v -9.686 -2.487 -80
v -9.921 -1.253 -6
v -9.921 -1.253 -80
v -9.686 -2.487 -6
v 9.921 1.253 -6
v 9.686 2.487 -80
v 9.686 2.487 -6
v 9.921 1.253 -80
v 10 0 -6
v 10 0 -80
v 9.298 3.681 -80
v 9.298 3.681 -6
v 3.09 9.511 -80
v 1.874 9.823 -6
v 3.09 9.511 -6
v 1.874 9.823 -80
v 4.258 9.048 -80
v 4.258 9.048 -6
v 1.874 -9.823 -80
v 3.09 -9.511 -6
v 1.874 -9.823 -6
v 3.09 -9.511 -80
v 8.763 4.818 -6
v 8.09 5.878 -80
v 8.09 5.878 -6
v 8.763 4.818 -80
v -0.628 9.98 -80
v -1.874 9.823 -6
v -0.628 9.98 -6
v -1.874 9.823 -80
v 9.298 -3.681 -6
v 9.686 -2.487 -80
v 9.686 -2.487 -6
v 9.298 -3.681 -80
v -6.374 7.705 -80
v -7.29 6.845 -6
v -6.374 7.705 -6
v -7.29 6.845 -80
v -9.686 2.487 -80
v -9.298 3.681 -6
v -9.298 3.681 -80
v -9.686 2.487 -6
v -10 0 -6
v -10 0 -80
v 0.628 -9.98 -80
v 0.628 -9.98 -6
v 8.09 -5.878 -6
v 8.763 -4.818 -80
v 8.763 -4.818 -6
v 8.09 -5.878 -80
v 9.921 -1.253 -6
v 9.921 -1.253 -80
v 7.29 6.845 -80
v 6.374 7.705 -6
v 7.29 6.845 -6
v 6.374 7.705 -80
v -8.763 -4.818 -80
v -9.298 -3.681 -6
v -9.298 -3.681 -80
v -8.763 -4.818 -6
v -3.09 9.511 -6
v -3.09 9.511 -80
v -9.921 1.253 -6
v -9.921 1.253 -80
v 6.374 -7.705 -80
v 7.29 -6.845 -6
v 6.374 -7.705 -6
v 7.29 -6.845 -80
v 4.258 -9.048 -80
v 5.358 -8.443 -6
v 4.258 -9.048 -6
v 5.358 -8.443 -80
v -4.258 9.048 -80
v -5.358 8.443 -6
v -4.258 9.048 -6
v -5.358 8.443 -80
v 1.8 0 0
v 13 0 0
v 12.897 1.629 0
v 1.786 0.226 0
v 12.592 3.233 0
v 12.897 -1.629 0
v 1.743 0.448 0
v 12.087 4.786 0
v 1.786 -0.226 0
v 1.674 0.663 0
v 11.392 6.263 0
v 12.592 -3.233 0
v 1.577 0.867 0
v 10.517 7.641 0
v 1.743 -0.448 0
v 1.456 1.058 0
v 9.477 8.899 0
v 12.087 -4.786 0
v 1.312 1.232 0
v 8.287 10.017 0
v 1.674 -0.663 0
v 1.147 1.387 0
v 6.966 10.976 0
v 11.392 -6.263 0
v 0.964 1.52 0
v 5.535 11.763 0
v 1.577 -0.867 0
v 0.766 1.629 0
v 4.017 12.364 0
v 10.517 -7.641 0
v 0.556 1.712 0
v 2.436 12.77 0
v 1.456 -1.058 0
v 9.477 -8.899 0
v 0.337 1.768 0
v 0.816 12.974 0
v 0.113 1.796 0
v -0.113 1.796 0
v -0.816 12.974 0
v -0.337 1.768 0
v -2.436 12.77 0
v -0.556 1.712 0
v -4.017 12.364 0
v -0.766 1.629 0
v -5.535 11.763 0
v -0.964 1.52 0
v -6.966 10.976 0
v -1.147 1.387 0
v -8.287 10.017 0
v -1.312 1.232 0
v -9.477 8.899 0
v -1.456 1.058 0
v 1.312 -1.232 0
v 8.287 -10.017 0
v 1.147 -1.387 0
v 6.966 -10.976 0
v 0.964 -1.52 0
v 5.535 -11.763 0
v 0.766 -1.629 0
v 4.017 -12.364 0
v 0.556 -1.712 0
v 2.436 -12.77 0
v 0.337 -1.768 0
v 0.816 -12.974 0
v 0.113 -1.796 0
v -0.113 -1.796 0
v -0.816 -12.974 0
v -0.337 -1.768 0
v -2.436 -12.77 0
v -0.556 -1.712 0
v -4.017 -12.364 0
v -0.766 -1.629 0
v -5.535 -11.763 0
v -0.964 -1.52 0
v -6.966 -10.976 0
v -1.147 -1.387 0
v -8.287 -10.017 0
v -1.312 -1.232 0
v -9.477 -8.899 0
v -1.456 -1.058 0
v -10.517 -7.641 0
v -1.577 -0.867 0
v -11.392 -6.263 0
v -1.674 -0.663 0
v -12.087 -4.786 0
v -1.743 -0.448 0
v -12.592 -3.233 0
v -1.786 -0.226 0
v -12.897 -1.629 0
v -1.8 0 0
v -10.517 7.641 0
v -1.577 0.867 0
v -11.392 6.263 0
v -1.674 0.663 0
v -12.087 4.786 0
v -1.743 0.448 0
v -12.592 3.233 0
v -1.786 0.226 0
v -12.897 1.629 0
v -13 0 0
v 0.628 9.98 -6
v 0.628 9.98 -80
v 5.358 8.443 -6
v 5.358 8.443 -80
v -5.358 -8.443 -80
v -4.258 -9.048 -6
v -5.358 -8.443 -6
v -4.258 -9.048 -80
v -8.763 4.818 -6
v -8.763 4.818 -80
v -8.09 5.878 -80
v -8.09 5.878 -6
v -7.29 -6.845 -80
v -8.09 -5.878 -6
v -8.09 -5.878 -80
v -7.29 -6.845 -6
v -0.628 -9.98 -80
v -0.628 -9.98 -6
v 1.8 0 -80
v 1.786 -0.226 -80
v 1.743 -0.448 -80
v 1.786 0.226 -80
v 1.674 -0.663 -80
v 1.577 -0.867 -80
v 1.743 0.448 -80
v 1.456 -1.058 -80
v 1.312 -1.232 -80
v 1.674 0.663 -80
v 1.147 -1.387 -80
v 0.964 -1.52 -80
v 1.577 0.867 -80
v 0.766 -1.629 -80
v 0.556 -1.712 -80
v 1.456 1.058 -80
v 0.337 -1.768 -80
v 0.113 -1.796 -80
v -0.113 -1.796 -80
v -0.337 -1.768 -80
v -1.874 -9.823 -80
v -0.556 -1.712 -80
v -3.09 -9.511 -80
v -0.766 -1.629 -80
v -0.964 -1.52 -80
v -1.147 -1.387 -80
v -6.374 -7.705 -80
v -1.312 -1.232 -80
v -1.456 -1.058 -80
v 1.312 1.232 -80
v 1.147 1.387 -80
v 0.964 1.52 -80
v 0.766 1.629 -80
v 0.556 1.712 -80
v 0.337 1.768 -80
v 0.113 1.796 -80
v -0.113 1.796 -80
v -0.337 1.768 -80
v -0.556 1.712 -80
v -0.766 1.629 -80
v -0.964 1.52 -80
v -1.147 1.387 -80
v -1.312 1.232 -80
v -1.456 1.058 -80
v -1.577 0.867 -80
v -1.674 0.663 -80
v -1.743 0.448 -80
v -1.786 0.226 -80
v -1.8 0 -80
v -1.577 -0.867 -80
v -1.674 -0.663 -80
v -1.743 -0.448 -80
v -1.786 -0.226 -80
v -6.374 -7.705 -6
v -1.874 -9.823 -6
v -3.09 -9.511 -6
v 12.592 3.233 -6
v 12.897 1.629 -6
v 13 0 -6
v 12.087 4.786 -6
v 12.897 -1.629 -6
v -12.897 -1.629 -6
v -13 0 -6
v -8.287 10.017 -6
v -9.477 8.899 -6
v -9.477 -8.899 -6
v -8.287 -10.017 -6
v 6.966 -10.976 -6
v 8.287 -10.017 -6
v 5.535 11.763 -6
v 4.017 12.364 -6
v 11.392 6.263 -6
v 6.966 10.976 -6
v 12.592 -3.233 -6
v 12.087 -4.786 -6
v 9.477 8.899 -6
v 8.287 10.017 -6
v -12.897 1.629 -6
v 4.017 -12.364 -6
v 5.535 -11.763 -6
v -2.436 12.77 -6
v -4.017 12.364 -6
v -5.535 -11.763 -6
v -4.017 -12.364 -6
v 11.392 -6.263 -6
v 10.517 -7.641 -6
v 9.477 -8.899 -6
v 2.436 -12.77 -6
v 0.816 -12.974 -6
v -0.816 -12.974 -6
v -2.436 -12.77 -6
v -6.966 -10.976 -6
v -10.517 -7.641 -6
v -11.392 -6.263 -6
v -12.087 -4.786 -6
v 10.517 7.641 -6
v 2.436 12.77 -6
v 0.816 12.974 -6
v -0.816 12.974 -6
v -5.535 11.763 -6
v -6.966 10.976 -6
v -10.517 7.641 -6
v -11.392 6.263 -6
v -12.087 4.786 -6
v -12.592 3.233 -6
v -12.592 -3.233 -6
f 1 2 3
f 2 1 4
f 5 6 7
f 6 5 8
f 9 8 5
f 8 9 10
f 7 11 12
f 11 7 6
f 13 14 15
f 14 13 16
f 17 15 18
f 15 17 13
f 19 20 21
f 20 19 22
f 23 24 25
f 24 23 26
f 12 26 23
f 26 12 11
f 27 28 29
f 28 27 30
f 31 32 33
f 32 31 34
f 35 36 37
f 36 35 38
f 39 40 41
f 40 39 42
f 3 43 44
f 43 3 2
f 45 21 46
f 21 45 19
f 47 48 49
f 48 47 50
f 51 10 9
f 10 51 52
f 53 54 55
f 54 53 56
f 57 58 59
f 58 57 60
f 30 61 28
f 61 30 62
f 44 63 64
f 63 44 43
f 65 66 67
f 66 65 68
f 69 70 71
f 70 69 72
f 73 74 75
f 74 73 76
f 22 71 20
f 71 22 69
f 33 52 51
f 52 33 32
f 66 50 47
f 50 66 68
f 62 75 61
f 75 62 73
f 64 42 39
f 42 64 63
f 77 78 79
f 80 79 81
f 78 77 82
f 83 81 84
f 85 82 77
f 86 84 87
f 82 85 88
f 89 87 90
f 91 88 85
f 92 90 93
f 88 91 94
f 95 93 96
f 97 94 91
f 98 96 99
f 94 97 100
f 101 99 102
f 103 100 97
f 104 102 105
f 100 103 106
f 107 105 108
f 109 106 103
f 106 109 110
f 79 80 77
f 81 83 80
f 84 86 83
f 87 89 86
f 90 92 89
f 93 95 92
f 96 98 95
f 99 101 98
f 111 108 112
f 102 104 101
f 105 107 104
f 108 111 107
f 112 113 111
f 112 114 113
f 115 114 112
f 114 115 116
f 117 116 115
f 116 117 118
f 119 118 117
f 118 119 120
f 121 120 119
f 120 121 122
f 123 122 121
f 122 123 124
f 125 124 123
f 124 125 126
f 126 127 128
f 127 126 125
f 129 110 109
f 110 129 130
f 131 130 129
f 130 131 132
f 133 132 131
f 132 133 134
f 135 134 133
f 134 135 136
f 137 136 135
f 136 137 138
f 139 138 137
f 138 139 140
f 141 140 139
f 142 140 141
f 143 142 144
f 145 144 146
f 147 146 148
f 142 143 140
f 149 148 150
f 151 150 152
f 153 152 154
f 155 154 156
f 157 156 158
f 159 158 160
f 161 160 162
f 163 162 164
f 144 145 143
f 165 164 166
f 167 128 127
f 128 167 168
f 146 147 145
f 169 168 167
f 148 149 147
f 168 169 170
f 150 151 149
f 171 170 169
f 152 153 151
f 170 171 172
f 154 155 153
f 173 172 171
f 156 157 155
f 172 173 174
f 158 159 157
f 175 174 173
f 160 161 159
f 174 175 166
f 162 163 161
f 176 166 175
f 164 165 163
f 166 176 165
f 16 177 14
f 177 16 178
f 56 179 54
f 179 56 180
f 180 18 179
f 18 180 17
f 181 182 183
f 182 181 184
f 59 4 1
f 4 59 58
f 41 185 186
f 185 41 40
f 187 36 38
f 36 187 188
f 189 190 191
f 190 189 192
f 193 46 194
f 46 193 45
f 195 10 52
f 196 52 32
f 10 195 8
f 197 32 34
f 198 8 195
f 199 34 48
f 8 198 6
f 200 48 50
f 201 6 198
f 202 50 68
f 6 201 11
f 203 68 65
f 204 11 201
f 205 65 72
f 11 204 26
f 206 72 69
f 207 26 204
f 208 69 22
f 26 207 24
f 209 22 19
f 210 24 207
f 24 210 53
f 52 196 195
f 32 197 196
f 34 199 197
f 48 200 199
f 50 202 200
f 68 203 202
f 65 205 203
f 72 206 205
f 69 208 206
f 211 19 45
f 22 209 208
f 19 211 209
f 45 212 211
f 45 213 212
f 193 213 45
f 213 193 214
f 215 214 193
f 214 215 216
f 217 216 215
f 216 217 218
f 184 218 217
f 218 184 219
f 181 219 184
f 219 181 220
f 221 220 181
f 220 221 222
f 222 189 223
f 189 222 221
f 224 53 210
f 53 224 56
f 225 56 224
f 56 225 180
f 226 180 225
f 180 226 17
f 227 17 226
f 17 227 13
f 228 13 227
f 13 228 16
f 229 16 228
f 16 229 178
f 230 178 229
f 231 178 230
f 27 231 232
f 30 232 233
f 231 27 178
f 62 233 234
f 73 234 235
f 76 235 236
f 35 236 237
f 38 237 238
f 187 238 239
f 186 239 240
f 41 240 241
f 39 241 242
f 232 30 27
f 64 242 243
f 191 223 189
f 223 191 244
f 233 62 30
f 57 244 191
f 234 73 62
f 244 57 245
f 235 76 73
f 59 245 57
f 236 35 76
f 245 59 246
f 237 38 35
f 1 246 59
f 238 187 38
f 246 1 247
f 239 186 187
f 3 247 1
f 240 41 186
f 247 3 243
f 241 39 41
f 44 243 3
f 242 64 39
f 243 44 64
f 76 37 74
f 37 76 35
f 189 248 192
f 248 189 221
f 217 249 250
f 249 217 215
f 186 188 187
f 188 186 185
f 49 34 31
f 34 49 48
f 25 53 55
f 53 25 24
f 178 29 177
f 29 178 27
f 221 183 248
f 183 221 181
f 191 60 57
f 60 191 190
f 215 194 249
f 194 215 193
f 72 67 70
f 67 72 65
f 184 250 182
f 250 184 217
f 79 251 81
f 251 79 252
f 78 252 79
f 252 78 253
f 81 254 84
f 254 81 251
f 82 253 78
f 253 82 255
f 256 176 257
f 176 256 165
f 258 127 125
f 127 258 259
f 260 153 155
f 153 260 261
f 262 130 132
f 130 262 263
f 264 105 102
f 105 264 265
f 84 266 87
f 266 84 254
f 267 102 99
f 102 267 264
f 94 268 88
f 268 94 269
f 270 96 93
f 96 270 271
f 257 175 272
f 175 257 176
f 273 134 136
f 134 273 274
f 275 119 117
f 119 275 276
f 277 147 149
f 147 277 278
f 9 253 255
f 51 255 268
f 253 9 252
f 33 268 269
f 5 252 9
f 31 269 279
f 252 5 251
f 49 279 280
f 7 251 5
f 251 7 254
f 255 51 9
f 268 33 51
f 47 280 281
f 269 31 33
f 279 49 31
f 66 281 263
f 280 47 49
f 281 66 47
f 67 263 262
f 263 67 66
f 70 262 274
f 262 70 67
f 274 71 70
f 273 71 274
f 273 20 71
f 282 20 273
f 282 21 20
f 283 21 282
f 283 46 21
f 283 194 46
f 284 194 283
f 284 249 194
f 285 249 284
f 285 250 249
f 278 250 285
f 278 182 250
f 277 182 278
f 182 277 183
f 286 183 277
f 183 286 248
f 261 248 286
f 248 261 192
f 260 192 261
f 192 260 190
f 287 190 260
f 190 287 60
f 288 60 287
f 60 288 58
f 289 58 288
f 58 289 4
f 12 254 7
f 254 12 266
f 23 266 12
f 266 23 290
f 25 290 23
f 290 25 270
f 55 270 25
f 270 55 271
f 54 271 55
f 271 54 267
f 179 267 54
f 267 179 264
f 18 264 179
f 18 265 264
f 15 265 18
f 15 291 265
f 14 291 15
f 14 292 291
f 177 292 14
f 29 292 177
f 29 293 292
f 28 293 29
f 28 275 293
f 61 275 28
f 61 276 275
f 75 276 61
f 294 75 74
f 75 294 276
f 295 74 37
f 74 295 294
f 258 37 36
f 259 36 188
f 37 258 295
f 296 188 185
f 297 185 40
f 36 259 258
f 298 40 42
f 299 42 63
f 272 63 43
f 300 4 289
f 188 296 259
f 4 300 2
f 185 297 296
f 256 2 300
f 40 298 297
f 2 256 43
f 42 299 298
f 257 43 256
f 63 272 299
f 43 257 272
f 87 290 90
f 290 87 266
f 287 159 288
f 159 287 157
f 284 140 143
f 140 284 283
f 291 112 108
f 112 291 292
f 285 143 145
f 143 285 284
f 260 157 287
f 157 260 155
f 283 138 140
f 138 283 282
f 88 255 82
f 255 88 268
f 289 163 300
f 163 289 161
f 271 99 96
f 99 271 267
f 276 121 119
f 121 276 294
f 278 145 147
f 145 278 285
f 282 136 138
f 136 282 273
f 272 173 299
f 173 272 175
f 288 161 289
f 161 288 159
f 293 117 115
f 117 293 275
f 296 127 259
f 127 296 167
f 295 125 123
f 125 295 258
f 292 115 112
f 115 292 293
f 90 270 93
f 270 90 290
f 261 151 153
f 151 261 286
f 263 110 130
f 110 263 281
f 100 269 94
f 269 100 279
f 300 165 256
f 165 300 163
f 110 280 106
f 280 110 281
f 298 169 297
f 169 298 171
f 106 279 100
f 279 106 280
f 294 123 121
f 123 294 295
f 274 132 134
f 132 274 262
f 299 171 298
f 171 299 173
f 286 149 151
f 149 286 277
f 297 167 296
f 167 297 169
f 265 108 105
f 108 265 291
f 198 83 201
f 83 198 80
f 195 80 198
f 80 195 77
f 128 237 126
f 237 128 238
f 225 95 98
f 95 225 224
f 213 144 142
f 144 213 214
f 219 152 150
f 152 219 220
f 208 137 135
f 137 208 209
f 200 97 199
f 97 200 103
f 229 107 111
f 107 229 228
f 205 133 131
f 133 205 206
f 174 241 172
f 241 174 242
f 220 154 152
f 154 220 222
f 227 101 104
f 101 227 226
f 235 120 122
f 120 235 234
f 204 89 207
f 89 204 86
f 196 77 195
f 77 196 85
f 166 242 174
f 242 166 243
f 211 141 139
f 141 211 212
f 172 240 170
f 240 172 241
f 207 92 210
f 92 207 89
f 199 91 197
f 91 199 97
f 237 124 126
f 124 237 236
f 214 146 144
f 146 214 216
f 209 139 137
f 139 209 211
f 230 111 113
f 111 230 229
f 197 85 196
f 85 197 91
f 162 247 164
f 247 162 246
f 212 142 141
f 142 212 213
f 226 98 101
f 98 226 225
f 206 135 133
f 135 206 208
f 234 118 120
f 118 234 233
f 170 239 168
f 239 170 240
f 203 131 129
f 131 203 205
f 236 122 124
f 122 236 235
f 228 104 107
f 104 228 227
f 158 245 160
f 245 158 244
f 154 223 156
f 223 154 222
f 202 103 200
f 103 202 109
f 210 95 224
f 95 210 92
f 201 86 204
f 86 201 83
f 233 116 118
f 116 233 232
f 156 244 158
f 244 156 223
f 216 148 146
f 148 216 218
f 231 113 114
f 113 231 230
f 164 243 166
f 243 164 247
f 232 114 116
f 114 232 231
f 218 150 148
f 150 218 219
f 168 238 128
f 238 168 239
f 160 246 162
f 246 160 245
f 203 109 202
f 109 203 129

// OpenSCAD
$fn = 50;


difference() {
	union() {
		translate(v = [0, 0, -80.0000000000]) {
			cylinder(h = 80, r = 10.0000000000);
		}
		translate(v = [0, 0, -6.0000000000]) {
			cylinder(h = 6, r = 13.0000000000);
		}
	}
	union() {
		#translate(v = [0, 0, -80]) {
			cylinder(h = 80, r = 1.8000000000);
		}
	}
}
